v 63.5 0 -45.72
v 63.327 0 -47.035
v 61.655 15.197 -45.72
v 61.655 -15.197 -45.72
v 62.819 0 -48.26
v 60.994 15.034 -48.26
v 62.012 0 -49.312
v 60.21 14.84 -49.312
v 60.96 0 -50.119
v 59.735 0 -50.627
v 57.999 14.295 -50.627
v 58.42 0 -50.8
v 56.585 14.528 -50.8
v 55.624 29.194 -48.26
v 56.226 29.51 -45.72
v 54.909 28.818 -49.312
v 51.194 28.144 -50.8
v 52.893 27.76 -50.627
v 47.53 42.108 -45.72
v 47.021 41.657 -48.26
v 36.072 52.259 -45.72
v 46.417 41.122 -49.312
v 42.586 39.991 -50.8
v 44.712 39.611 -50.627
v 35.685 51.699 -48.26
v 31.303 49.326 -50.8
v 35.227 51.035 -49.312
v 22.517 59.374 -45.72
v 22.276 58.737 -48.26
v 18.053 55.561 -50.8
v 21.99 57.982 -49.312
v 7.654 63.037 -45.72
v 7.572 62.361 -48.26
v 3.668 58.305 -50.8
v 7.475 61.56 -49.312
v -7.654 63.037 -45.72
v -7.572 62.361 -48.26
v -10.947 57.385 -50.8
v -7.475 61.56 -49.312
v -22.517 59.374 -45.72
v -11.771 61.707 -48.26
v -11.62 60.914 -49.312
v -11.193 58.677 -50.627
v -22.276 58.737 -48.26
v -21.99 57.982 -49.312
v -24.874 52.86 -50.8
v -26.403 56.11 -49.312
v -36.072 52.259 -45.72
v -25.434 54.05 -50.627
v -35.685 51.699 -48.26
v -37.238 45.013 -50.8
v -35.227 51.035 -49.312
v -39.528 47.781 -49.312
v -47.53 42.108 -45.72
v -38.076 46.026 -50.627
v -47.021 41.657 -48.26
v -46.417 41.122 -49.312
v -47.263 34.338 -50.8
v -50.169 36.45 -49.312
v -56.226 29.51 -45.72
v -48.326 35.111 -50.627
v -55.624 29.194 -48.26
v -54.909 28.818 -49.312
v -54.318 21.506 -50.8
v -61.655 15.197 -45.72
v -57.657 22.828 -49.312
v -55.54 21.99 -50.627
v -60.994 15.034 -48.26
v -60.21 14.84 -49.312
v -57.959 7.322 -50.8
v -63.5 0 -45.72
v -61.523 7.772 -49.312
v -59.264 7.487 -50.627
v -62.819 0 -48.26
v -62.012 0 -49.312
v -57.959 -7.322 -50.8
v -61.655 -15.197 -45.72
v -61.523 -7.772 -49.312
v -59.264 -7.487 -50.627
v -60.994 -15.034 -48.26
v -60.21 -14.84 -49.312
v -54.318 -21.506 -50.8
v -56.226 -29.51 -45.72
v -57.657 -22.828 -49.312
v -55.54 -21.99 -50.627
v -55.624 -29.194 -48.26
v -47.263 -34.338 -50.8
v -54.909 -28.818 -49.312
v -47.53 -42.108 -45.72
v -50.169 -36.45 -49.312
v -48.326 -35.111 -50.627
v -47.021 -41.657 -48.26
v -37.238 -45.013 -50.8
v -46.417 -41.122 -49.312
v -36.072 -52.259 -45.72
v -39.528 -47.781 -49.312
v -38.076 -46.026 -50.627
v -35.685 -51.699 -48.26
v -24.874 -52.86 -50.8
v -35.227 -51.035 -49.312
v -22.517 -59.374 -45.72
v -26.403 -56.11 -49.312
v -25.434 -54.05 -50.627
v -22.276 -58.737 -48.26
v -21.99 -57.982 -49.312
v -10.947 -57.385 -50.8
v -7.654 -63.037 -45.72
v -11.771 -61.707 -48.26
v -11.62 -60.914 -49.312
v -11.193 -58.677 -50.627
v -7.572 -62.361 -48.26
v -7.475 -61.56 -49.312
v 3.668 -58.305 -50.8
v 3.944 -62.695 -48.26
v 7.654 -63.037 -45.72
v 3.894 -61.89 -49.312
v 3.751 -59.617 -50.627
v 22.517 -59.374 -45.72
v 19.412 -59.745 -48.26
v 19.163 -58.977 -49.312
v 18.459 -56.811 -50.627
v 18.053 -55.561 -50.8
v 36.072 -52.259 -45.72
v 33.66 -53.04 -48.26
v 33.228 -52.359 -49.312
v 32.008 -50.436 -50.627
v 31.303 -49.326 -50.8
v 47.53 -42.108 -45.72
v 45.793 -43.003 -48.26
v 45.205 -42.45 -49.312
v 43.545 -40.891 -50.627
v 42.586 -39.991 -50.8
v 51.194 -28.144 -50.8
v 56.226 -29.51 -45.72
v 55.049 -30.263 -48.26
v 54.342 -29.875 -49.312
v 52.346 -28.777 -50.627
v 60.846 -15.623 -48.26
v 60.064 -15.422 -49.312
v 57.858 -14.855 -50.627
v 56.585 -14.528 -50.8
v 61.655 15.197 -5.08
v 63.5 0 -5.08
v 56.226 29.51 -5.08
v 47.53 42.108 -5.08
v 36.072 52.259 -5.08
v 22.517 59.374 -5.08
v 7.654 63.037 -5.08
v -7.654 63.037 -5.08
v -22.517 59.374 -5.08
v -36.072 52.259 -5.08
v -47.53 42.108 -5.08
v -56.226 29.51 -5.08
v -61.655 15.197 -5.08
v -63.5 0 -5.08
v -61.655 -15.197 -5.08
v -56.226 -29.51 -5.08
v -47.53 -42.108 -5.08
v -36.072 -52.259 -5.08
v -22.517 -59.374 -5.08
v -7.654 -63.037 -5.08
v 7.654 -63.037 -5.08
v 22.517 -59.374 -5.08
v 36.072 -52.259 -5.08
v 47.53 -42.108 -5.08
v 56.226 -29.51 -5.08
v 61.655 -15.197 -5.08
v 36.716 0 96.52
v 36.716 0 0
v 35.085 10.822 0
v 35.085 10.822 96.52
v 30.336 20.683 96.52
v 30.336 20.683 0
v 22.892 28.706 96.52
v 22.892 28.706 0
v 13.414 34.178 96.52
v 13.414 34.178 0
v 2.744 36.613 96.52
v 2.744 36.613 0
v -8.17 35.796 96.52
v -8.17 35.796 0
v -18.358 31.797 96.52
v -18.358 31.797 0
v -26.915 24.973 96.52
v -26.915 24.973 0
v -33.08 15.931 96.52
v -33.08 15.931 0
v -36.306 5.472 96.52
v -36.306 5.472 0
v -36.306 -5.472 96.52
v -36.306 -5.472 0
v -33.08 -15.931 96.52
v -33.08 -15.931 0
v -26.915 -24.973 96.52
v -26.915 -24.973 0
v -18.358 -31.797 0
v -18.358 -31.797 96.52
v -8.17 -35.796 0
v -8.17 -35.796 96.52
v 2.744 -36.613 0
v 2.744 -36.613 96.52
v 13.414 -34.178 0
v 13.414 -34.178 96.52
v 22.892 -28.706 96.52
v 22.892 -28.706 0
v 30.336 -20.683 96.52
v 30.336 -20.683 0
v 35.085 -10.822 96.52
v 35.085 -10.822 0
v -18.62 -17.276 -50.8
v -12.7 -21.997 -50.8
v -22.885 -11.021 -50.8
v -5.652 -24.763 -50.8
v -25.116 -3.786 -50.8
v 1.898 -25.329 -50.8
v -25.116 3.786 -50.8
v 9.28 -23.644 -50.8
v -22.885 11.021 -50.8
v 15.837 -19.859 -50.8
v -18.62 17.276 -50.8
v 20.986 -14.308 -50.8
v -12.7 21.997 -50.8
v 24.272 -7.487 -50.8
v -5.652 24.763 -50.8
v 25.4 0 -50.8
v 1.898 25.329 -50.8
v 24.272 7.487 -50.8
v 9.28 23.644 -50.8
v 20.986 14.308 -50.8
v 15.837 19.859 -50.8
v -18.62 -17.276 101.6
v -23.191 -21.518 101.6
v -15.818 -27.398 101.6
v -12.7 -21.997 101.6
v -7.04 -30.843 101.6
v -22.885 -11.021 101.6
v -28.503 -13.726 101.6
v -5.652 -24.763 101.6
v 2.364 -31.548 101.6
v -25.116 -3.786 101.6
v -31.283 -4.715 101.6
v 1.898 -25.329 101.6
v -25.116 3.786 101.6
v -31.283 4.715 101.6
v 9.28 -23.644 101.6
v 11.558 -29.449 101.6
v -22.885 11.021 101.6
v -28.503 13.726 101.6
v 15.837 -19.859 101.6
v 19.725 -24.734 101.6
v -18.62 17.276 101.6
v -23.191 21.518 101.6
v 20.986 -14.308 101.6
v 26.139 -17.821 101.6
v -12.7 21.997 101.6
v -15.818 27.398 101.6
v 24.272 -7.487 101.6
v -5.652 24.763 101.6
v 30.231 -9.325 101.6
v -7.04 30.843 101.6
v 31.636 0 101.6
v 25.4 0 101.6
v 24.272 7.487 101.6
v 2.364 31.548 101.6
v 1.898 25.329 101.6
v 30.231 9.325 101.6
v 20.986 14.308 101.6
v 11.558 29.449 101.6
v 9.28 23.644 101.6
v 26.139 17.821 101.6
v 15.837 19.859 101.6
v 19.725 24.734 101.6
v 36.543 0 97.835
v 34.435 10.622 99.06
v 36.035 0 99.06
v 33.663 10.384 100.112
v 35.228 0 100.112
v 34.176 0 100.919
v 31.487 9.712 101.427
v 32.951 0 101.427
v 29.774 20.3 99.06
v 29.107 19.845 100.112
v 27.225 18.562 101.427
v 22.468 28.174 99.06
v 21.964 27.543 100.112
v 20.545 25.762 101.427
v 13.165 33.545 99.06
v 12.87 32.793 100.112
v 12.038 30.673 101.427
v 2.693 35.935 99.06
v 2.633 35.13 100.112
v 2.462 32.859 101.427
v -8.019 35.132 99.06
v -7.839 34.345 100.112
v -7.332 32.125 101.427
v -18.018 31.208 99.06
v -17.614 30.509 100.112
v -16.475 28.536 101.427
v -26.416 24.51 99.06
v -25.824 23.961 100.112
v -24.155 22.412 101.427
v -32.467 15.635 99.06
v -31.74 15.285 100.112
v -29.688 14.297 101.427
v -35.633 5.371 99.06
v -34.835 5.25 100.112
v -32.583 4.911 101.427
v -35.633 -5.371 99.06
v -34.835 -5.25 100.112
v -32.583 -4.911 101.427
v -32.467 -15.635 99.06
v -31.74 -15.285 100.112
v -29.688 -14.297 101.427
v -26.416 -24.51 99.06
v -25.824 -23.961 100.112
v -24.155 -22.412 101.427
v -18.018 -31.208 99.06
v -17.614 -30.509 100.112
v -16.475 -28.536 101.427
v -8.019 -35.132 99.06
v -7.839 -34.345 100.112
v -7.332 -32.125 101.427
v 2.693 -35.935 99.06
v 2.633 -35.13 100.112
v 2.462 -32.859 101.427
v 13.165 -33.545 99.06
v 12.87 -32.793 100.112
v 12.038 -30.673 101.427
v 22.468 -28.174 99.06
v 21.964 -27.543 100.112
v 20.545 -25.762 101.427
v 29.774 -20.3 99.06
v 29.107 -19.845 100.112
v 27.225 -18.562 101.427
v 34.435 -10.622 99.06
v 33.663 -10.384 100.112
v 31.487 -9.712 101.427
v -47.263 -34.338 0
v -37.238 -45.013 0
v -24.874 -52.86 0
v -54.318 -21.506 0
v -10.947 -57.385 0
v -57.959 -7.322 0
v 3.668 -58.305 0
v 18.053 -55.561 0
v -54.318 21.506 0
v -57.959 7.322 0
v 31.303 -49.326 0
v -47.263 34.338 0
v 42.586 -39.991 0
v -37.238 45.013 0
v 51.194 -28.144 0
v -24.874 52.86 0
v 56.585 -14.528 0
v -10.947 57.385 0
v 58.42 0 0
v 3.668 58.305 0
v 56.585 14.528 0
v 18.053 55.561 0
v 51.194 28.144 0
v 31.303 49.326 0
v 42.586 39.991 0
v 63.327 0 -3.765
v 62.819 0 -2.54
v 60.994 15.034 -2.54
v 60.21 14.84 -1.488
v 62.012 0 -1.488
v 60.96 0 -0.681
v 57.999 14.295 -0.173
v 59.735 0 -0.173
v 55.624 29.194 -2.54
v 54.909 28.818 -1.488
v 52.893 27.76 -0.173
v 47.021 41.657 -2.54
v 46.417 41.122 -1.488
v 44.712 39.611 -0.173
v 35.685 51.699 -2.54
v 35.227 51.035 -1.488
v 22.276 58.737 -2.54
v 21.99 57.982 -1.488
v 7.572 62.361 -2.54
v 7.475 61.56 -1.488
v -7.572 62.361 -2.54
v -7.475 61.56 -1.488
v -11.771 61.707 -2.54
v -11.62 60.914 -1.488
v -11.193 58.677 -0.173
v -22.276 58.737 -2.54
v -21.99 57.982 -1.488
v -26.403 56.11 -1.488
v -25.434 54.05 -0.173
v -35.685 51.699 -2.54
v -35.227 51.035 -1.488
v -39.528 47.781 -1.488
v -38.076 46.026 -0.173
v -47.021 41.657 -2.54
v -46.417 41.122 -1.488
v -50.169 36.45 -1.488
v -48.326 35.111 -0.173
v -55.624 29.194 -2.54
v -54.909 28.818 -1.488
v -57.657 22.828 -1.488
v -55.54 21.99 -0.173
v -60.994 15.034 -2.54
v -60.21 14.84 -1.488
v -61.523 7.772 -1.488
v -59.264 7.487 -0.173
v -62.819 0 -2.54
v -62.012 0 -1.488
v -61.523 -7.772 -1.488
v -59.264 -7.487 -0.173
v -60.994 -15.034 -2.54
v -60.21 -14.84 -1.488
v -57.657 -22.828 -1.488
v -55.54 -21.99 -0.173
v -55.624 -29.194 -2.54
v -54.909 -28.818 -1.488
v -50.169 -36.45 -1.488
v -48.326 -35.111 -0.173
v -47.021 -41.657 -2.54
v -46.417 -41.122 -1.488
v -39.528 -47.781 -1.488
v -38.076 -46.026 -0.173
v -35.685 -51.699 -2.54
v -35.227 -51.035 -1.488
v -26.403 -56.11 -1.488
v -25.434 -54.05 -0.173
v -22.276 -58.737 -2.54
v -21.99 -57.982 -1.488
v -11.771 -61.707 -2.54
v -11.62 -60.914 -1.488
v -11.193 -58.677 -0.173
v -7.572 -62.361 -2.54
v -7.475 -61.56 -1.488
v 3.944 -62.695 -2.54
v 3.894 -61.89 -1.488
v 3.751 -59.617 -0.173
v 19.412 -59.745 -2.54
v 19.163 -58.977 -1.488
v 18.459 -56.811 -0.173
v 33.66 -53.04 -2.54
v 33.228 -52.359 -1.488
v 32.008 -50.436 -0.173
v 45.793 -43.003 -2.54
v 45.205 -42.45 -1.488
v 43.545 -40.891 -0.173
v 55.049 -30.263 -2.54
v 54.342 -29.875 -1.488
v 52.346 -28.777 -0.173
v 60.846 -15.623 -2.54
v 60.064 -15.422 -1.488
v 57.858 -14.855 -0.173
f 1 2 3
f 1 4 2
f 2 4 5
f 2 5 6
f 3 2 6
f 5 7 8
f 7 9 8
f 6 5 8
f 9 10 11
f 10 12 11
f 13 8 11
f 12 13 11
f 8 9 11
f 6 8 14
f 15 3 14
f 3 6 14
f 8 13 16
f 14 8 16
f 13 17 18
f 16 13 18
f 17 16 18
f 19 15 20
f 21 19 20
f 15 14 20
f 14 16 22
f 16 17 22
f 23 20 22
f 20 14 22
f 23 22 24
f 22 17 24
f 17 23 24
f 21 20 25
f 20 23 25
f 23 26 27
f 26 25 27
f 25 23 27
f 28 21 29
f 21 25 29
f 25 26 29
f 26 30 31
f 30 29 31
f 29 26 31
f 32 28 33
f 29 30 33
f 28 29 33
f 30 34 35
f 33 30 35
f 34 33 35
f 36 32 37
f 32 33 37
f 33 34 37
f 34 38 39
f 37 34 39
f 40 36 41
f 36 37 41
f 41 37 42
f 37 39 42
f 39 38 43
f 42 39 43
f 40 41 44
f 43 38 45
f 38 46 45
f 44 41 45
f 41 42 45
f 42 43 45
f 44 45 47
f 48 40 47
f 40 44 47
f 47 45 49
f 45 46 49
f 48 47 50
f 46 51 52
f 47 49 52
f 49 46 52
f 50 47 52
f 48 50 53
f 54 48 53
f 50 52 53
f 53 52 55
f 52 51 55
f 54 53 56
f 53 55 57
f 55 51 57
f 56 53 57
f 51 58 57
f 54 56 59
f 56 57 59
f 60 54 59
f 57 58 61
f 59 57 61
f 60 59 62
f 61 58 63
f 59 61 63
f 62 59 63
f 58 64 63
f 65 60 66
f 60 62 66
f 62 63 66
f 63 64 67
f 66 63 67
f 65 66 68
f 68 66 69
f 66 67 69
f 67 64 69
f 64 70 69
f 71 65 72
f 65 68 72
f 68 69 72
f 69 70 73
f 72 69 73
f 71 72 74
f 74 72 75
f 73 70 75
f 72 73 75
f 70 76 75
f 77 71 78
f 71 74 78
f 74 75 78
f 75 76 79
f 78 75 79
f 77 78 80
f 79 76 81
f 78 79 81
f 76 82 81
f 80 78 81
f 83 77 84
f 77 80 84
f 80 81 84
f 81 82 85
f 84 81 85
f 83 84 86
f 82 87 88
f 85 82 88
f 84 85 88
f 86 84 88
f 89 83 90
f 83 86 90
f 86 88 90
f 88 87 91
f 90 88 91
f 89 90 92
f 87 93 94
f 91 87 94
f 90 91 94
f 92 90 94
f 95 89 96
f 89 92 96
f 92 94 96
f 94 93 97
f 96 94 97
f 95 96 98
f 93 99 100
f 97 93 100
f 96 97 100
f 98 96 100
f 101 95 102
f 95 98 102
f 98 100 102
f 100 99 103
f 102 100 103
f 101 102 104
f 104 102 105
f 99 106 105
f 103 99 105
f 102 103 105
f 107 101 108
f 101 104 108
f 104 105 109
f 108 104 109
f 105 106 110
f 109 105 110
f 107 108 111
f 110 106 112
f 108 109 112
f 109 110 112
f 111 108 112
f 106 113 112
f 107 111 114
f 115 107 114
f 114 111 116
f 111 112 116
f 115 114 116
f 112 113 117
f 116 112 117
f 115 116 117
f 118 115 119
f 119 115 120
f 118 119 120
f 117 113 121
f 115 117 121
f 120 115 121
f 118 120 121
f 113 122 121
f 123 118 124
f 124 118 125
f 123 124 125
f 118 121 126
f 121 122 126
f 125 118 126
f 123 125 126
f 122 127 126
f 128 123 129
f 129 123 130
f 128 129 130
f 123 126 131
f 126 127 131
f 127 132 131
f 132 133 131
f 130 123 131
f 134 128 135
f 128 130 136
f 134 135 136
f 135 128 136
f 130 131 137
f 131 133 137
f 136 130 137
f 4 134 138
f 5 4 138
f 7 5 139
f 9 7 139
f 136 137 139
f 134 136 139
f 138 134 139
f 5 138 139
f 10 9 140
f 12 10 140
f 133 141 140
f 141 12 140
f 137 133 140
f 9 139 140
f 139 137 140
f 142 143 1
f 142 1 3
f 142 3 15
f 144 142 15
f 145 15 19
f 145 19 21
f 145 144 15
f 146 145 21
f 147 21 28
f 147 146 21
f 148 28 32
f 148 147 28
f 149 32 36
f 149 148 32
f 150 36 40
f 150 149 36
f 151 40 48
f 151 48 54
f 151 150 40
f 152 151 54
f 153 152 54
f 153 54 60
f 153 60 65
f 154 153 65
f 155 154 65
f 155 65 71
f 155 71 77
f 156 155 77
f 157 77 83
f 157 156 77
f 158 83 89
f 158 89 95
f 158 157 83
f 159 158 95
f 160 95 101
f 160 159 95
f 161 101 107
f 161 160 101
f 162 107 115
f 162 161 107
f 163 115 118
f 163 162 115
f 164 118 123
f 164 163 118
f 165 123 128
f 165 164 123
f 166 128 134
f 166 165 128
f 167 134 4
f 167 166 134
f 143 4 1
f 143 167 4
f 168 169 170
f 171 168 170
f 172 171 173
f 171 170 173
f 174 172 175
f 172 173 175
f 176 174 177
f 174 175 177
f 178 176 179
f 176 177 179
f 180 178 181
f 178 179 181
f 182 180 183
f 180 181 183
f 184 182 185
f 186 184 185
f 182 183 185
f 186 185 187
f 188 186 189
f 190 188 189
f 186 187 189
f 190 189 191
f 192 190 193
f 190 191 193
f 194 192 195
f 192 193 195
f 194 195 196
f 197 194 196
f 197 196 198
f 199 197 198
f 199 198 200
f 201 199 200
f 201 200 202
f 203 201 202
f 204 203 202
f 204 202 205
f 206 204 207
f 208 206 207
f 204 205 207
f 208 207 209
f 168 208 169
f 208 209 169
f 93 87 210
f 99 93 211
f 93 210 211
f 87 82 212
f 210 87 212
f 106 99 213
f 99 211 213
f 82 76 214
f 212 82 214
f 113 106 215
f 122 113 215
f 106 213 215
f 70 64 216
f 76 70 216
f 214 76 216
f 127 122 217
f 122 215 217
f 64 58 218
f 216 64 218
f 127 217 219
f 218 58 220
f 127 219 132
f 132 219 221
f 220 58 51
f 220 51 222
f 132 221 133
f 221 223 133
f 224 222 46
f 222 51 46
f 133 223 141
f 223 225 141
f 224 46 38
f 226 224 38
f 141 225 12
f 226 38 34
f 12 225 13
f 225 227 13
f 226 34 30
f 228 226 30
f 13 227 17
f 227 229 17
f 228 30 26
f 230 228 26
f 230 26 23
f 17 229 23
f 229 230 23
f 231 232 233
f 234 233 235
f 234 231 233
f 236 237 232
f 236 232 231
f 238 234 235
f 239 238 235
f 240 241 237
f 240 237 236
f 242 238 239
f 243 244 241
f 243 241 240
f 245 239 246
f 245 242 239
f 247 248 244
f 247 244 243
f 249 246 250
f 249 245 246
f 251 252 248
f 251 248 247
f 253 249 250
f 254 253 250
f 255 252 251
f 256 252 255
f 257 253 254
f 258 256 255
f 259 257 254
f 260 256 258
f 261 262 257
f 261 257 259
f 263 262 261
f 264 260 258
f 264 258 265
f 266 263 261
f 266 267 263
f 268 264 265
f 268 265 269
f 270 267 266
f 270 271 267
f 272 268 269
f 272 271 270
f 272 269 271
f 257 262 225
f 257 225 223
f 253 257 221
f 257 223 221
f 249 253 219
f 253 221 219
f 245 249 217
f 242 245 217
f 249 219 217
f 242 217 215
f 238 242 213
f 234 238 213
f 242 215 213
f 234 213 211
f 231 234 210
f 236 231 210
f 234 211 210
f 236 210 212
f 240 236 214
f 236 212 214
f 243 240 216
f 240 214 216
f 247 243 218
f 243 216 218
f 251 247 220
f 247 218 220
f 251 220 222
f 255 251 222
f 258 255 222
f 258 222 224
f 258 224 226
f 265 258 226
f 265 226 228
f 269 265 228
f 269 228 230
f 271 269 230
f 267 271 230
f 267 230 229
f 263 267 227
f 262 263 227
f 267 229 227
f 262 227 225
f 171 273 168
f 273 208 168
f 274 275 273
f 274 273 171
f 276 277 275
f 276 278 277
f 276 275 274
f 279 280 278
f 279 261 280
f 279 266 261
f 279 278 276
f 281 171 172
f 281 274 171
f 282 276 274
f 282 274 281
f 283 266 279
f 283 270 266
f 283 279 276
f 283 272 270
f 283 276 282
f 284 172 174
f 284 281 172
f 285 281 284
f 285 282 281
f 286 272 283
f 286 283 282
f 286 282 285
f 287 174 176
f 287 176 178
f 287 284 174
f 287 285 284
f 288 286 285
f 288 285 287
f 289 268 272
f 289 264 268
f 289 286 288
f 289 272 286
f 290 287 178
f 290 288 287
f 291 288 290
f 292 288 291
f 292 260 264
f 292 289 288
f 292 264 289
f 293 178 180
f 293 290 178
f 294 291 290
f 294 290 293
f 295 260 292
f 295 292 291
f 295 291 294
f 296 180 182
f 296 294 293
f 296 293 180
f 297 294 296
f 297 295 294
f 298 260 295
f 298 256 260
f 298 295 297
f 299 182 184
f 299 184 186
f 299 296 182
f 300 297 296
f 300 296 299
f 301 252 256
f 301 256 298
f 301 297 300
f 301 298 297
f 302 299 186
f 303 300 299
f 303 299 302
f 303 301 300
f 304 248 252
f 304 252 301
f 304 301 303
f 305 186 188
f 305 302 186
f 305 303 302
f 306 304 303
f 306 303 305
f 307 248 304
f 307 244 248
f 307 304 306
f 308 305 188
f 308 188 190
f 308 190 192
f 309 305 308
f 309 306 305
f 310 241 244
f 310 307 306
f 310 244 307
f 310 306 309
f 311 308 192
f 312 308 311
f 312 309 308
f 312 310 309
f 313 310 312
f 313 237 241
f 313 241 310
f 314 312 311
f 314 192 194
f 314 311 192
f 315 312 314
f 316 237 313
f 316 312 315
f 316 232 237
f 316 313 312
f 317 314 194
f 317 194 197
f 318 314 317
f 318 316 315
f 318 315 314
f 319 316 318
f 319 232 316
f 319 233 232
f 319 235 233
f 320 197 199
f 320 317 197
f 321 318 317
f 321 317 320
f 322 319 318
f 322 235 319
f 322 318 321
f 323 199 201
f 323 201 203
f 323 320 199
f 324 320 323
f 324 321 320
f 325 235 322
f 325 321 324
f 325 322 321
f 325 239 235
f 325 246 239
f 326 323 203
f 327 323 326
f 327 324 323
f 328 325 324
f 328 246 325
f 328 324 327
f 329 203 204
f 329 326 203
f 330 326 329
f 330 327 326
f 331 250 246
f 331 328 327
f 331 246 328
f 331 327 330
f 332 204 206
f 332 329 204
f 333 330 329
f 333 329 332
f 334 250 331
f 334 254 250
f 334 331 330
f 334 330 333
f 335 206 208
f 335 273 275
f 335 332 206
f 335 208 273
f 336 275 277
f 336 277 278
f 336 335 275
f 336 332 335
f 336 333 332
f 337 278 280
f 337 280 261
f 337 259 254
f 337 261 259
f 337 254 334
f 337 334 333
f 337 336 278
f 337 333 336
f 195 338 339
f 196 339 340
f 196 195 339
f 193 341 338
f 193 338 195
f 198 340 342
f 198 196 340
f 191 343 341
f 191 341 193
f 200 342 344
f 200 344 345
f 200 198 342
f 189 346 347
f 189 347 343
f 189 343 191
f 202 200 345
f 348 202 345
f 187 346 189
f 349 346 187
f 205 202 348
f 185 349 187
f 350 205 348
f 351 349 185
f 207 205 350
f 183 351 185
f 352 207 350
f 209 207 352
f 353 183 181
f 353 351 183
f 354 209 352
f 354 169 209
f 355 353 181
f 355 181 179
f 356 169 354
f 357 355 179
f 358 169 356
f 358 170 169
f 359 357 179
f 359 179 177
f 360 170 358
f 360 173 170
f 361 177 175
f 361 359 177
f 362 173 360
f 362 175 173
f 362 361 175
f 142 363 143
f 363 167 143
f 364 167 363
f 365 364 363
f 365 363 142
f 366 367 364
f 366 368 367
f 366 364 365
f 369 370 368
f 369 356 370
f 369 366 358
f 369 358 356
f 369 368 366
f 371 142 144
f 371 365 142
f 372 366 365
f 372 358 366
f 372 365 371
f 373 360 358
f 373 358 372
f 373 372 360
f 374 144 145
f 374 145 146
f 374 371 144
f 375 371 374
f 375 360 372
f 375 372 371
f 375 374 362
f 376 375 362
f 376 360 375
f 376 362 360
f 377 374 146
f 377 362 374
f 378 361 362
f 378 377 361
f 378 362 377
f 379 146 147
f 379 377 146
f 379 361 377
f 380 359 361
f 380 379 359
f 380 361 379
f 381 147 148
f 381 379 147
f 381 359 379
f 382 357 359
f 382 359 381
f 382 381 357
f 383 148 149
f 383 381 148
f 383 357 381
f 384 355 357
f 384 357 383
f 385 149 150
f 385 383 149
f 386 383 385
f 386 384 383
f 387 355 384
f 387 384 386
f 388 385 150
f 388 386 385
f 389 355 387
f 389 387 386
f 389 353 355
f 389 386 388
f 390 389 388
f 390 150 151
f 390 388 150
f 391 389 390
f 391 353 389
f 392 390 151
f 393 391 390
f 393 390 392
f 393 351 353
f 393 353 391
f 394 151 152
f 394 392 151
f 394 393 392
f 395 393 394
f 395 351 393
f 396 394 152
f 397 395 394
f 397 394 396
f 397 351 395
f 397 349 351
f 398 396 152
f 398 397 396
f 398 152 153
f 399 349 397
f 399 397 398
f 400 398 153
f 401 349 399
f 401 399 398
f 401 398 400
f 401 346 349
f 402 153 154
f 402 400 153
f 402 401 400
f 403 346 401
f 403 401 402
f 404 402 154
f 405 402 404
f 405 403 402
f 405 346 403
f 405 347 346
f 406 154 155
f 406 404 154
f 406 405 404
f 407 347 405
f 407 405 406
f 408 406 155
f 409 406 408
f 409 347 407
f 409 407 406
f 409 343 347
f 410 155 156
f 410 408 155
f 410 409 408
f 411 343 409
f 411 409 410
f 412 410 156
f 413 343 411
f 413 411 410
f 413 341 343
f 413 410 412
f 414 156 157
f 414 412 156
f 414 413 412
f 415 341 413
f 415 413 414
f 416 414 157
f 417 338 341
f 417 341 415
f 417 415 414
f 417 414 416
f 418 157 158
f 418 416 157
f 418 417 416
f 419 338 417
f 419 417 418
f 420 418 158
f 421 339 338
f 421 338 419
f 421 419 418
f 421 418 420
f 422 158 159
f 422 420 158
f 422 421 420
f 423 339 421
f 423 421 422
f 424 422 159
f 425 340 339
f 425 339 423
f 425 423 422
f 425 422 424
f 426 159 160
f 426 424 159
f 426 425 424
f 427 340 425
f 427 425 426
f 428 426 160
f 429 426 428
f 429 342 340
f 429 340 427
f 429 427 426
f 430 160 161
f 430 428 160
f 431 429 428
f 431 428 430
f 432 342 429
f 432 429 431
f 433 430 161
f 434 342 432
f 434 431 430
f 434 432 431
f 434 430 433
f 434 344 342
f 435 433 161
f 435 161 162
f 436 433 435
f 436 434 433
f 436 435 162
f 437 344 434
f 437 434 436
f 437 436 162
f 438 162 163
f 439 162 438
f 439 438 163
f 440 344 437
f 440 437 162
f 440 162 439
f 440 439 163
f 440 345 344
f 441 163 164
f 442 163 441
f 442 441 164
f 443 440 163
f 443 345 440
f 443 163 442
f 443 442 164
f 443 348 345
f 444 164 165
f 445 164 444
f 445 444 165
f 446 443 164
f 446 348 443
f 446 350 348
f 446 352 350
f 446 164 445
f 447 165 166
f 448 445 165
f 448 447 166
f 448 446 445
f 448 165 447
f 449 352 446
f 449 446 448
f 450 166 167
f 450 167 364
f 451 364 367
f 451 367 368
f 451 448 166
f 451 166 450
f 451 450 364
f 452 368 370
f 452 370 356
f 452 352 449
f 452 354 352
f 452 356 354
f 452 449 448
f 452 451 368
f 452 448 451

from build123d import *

# Parameters (mm, degrees)
F0_R     = 36.71609
F1_DEPTH = 101.6
F0_R_2   = 63.5
F2_DEPTH = 50.8
F3_R     = 5.08
F4_R     = 25.4
F5_DEPTH = 152.4


with BuildPart() as f1:
    # F0 (on Top) → F1 (new body)
    with BuildSketch(Plane.XY):
        Circle(F0_R)
    extrude(amount=F1_DEPTH)

    # F0 (on Top) → F2 (join)
    with BuildSketch(Plane.XY):
        Circle(F0_R_2)
        Circle(F0_R, mode=Mode.SUBTRACT)
        Circle(F0_R)
    extrude(amount=-F2_DEPTH)

    # F3
    f3_edges = [f1.edges().sort_by_distance(p)[0] for p in [
        (-63.5, 0, 0),
        (-63.5, 0, -50.8),
        (-36.71609, 0, 101.6),
    ]]
    fillet(f3_edges, radius=F3_R)

    # F4 (on face) → F5 (cut)
    with BuildSketch(Plane(origin=(0, 0, -50.8), x_dir=(1, 0, 0), z_dir=(0, 0, -1))):
        Circle(F4_R)
    extrude(amount=-F5_DEPTH, mode=Mode.SUBTRACT)


solid = f1.part
